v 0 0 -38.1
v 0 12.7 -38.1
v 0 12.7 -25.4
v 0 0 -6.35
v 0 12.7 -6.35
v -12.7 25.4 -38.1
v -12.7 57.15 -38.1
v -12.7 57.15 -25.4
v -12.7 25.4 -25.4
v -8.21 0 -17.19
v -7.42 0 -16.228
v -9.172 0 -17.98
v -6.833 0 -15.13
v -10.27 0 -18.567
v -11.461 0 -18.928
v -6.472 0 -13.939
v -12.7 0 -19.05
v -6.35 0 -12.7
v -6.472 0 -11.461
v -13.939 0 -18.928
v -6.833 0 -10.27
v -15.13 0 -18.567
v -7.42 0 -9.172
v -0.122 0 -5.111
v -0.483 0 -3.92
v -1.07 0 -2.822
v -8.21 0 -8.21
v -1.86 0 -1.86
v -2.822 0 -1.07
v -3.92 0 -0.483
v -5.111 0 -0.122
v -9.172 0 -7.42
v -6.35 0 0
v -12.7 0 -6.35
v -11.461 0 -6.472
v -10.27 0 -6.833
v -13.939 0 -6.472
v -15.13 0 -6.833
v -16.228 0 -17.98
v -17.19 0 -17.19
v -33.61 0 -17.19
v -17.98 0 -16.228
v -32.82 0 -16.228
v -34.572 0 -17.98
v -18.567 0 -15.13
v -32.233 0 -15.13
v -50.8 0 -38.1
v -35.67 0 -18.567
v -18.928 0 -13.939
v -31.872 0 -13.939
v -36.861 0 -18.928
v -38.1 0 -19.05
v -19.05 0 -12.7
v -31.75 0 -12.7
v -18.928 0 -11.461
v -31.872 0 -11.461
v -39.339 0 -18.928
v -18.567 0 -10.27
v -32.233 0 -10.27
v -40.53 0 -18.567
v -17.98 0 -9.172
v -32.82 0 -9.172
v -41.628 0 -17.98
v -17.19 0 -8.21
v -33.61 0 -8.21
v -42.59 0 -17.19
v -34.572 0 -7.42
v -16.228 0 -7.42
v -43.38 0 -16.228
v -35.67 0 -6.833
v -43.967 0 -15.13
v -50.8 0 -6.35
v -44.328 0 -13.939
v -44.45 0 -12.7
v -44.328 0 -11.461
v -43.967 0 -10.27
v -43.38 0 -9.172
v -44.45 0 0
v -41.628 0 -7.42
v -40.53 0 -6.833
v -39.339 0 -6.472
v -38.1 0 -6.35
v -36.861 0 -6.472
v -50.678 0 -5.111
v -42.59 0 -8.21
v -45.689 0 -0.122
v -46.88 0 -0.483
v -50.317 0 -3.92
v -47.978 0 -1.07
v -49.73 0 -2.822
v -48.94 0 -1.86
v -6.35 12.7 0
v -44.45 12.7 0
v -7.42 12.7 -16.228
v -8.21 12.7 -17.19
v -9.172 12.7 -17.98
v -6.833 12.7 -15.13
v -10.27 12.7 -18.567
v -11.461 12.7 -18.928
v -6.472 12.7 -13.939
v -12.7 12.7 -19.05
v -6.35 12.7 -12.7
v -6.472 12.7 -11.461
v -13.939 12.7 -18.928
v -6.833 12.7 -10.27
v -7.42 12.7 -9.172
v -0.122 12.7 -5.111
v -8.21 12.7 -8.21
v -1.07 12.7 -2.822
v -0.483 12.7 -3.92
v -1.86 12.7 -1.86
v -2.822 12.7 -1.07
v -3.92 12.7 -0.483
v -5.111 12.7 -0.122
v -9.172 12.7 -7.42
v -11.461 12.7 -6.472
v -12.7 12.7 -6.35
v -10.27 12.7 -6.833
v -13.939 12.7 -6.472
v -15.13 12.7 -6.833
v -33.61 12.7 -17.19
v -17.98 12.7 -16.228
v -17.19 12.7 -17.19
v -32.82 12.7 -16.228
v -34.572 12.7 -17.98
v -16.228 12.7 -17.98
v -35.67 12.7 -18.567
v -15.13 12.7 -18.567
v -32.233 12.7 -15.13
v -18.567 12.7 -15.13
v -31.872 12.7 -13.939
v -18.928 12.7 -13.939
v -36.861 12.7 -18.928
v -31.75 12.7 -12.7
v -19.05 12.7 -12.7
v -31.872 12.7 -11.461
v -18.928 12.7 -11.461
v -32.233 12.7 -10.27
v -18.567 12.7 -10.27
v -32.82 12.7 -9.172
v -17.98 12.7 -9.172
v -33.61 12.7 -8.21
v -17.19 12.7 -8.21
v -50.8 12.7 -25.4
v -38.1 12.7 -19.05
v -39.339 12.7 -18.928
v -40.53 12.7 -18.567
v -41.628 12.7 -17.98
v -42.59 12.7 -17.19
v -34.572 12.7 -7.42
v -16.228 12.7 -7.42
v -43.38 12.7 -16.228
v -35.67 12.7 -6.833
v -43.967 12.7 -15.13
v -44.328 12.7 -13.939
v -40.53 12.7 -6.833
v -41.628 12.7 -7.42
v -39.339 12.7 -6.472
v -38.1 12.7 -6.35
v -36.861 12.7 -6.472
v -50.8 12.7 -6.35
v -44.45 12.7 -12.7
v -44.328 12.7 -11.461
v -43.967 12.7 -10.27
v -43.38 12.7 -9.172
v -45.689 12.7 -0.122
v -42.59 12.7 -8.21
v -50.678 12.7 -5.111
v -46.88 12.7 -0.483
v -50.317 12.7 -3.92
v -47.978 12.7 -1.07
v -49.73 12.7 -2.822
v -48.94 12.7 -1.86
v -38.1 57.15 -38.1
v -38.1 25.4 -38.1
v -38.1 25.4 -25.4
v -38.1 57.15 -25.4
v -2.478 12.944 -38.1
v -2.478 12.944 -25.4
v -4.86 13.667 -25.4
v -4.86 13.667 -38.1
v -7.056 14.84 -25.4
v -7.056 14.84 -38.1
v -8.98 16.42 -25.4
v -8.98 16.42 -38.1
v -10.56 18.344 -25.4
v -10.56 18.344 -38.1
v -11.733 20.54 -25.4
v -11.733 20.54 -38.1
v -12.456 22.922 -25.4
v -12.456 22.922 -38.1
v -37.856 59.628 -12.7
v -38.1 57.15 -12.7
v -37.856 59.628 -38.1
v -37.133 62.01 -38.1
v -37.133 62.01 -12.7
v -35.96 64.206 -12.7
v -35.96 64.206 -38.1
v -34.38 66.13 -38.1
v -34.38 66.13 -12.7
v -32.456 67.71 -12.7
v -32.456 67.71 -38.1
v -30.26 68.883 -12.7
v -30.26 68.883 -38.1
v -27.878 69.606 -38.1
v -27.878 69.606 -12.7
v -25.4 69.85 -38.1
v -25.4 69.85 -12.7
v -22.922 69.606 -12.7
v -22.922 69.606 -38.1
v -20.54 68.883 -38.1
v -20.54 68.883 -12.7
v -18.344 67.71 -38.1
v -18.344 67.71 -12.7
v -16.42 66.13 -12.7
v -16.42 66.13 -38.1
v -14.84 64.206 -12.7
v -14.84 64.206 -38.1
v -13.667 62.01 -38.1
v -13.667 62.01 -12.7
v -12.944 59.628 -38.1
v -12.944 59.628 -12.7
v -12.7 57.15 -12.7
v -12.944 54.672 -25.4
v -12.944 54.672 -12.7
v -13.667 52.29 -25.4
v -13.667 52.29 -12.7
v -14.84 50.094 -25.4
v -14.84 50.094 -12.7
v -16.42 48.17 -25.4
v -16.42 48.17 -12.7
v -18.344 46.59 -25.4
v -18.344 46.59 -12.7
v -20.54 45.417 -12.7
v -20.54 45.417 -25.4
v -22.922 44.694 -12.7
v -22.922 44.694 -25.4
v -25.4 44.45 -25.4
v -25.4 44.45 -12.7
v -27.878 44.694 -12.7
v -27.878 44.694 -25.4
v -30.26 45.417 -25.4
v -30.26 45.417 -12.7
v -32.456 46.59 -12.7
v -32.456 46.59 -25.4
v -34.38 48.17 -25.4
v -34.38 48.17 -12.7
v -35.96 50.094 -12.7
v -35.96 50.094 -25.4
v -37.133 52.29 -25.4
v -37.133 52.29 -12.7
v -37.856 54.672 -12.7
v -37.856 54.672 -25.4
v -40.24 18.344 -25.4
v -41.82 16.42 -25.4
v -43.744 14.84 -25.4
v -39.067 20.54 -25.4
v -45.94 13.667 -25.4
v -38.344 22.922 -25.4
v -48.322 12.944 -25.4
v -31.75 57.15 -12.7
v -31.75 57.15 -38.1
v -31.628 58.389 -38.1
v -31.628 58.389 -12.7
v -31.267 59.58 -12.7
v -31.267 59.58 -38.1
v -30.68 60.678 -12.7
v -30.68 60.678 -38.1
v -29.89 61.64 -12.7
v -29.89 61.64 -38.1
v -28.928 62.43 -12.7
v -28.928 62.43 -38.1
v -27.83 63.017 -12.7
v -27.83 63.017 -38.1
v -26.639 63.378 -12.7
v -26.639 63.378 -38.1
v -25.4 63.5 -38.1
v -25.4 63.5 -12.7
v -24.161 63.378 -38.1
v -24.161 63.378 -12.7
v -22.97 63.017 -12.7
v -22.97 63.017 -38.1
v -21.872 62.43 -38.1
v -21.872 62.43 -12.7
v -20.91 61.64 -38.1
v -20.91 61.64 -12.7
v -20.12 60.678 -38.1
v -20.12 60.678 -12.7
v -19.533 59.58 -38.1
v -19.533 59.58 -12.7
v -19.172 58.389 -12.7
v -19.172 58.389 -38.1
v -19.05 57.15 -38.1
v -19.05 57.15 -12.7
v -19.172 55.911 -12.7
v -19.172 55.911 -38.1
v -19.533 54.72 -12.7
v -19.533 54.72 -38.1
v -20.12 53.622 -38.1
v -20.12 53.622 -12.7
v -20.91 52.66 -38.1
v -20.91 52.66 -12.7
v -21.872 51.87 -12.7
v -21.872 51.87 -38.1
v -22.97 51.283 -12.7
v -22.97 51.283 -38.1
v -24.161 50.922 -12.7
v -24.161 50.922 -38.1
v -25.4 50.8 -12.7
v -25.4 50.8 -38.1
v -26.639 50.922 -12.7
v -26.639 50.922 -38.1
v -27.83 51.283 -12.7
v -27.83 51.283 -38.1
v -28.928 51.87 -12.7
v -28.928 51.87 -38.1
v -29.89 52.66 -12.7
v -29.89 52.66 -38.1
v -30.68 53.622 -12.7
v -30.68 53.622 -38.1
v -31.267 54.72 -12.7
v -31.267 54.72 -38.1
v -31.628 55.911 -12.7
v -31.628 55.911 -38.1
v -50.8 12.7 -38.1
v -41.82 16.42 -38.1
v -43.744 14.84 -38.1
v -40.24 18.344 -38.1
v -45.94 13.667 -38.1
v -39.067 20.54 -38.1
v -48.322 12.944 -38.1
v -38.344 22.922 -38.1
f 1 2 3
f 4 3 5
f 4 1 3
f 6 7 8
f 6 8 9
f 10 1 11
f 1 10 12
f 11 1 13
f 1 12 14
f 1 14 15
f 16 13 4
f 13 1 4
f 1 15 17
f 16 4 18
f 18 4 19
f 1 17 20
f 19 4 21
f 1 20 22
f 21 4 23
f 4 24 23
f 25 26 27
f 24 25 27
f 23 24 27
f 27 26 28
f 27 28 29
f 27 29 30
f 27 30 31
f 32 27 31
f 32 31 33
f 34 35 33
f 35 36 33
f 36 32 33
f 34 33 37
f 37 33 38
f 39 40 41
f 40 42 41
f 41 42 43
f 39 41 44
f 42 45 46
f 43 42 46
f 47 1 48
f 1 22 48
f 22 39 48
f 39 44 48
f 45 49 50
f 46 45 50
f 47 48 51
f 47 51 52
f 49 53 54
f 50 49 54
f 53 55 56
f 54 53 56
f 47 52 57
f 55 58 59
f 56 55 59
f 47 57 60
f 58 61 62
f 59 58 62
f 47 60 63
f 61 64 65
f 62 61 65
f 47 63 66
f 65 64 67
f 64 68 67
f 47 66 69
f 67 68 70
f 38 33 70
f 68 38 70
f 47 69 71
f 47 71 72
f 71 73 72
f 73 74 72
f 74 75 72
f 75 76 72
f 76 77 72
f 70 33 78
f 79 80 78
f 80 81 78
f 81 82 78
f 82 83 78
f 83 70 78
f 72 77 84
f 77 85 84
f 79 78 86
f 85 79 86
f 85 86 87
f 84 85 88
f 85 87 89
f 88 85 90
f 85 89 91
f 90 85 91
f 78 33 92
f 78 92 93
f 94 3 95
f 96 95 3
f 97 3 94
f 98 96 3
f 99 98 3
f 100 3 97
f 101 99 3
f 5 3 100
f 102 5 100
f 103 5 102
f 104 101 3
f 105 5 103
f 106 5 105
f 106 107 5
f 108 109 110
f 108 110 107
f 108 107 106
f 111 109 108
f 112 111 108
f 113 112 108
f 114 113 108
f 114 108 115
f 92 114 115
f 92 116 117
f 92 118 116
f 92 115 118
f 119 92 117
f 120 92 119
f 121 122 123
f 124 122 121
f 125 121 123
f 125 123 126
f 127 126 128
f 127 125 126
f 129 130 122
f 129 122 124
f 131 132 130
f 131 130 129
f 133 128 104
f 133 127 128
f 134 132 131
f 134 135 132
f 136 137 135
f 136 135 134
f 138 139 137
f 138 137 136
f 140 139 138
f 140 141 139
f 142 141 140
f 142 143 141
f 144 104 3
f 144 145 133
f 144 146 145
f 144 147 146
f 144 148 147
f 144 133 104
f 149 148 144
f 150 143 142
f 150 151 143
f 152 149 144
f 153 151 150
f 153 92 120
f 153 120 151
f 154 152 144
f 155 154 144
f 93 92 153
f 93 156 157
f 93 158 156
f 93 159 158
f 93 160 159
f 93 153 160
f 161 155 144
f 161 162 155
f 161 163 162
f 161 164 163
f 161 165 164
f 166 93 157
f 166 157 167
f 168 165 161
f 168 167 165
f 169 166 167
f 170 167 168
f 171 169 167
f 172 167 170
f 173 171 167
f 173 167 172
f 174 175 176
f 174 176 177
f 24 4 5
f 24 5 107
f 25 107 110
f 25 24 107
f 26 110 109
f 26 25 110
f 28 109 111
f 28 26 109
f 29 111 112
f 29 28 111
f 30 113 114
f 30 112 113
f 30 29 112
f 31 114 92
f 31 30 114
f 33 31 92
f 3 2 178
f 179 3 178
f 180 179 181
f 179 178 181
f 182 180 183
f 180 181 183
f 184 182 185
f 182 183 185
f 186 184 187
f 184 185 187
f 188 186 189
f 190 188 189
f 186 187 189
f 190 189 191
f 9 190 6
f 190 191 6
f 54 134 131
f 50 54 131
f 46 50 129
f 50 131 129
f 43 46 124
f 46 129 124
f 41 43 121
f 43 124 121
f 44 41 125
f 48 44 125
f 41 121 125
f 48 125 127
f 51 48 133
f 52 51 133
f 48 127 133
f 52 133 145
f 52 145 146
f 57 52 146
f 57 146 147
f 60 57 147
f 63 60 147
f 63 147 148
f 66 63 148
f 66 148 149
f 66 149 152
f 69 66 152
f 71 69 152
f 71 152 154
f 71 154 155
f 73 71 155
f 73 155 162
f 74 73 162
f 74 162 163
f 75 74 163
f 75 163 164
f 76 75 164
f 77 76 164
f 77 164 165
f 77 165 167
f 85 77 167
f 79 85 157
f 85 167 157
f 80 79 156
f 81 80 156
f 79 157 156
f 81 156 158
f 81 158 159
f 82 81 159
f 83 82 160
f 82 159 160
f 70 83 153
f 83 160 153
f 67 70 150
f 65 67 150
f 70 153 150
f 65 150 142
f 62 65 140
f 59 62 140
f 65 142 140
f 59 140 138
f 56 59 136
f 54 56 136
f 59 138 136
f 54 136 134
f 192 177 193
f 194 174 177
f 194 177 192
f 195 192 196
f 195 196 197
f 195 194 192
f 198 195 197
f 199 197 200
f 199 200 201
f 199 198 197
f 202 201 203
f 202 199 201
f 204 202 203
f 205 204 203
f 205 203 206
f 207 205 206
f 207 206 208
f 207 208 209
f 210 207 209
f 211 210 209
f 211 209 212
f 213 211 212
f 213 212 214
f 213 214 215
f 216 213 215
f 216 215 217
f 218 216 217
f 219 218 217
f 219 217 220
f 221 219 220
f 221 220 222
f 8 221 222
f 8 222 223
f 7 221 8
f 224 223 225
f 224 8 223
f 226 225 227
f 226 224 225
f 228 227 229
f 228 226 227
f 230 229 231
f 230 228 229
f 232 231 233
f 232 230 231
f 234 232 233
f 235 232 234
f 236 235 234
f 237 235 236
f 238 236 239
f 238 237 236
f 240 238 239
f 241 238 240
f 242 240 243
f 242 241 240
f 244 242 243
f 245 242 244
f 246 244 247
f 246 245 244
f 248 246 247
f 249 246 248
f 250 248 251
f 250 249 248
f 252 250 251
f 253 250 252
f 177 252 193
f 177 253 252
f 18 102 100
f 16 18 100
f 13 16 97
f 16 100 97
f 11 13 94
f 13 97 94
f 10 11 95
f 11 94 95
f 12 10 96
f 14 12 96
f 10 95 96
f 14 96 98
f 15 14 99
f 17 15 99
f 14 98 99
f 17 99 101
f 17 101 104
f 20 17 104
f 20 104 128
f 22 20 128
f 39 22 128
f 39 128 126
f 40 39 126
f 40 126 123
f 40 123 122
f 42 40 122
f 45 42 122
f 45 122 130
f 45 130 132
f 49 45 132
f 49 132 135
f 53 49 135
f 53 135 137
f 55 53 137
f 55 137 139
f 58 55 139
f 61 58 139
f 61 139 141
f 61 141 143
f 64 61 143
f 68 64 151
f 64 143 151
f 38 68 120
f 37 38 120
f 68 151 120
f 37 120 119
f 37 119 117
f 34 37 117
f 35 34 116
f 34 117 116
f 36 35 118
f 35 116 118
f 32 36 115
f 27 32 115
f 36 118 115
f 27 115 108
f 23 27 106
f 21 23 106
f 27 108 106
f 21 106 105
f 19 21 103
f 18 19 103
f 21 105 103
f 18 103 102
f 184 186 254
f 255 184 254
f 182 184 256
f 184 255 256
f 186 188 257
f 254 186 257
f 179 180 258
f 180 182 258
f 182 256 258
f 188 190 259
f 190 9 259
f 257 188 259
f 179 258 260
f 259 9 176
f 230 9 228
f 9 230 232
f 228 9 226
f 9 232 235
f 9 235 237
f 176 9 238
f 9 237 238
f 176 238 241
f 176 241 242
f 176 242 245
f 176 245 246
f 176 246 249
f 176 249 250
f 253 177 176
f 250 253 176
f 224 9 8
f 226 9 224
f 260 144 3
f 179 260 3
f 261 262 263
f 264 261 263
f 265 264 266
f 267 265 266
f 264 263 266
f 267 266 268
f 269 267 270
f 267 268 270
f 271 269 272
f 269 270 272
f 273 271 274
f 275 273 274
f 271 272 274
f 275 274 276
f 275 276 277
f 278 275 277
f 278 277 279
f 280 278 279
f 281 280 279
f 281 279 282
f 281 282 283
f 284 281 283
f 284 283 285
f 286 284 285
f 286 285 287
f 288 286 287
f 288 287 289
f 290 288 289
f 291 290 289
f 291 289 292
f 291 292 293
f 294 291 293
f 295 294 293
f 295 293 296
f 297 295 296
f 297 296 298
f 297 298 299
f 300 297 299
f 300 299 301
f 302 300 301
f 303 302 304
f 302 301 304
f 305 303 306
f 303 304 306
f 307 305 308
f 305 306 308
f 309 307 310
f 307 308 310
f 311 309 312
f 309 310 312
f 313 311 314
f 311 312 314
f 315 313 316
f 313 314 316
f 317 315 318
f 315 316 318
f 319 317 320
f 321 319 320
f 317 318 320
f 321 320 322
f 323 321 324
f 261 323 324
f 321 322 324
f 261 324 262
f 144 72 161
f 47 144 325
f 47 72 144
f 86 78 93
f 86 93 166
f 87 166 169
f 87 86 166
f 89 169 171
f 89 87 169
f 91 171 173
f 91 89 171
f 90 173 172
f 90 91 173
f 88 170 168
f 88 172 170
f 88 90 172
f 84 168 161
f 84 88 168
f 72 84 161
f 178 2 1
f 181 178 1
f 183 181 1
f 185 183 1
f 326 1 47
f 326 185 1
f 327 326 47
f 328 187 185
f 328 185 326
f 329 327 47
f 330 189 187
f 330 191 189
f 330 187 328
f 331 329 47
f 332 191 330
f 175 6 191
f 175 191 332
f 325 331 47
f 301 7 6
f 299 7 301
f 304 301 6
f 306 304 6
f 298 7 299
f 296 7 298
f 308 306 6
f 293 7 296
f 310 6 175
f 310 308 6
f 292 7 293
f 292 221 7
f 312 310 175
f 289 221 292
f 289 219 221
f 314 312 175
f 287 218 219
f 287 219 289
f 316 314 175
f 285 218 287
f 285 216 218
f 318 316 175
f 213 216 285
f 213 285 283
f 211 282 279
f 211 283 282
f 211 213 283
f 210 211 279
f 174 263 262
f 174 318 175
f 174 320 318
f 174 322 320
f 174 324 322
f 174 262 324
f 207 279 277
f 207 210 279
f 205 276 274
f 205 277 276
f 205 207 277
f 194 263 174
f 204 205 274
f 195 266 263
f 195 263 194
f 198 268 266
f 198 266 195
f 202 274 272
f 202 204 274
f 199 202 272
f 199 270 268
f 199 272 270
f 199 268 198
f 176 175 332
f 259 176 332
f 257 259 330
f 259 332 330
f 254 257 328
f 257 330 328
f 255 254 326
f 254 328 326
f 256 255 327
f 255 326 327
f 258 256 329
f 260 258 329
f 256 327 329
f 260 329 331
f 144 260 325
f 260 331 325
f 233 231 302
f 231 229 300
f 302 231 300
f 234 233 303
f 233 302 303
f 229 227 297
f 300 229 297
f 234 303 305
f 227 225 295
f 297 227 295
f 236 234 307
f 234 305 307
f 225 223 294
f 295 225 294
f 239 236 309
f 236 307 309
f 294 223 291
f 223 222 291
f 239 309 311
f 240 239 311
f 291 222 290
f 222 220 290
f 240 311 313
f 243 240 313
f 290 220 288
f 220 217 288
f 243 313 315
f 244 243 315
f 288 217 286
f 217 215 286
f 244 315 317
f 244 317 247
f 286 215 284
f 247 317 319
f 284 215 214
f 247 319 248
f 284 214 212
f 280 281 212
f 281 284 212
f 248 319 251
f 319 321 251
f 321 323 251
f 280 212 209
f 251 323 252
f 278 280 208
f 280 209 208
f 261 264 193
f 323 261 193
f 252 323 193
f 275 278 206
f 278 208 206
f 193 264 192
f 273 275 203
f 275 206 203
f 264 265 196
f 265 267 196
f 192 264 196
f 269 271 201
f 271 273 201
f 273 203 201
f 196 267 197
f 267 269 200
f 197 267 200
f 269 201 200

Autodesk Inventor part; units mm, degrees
ref_plane "YZ Plane" through (0, 0, 0) normal (1, 0, 0) x (0, 1, 0)
ref_plane "XZ Plane" through (0, 0, 0) normal (0, 1, 0) x (-1, 0, 0)
ref_plane "XY Plane" through (0, 0, 0) normal (0, 0, 1) x (1, 0, 0)
sketch "Sketch1" plane through (0, 0, 0) normal (0, 1, 0) x (-1, 0, 0)
  line L0 (6.35, 0) -> (44.45, 0)
  line L1 (50.8, -6.35) -> (50.8, -38.1)
  line L2 (50.8, -38.1) -> (0, -38.1)
  line L3 (0, -38.1) -> (0, -6.35)
  arc A0 (50.8, -6.35) -> (44.45, 0) centre (44.45, -6.35) ccw
  arc A1 (6.35, 0) -> (0, -6.35) centre (6.35, -6.35) ccw
  point P0 (0, 0)
  point P1 (50.8, 0)
  dimension "d0" = 50.8
  dimension "d1" = 38.1
  dimension "d2" = 6.35
  dimension "d3" = 6.35
extrude "Extrusion1" add sketch "Sketch1" along normal blind 12.7
sketch "Sketch2" plane through (0, 0, -38.1) normal (0, 0, -1) x (-1, 0, 0)
  circle A0 centre (25.4, 57.15) radius 6.35
  circle A1 centre (25.4, 57.15) radius 12.7
  line L0 (38.1, 25.4) -> (38.1, 57.15)
  line L1 (12.7, 57.15) -> (12.7, 25.4)
  line L2 (0, 12.7) -> (50.8, 12.7) projected
  line L3 (6.35, 12.7) -> (0, 12.7) projected
  arc A2 (0, 12.7) -> (12.7, 25.4) centre (0, 25.4) ccw
  arc A3 (38.1, 25.4) -> (50.8, 12.7) centre (50.8, 25.4) ccw
  point P0 (0, 0)
  point P1 (25.4, 12.7)
  dimension "d6" = 12.7
  dimension "d7" = 25.4
  dimension "d12" = 44.45
extrude "Extrusion2" add sketch "Sketch2" against normal blind 12.7 contours L0 A3 L2 A2 L1 A1
extrude "Extrusion3" add sketch "Sketch2" against normal blind 25.4 contours A1
sketch "Sketch3" plane through (0, 12.7, 0) normal (0, 1, 0) x (1, 0, 0)
  circle A0 centre (-38.1, 12.7) radius 6.35
  circle A1 centre (-12.7, 12.7) radius 6.35
  line L0 (-44.45, 0) -> (-6.35, 0) projected
  line L1 (0, 6.35) -> (0, 25.4) projected
  line L2 (-50.8, 25.4) -> (-50.8, 6.35) projected
  point P0 (0, 0)
  dimension "d17" = 12.7
  dimension "d18" = 12.7
  dimension "d19" = 12.7
  dimension "d20" = 12.7
  dimension "d21" = 12.7
  dimension "d22" = 12.7
extrude "Extrusion4" cut sketch "Sketch3" against normal through all
properties part number "7.1 Part 5"
